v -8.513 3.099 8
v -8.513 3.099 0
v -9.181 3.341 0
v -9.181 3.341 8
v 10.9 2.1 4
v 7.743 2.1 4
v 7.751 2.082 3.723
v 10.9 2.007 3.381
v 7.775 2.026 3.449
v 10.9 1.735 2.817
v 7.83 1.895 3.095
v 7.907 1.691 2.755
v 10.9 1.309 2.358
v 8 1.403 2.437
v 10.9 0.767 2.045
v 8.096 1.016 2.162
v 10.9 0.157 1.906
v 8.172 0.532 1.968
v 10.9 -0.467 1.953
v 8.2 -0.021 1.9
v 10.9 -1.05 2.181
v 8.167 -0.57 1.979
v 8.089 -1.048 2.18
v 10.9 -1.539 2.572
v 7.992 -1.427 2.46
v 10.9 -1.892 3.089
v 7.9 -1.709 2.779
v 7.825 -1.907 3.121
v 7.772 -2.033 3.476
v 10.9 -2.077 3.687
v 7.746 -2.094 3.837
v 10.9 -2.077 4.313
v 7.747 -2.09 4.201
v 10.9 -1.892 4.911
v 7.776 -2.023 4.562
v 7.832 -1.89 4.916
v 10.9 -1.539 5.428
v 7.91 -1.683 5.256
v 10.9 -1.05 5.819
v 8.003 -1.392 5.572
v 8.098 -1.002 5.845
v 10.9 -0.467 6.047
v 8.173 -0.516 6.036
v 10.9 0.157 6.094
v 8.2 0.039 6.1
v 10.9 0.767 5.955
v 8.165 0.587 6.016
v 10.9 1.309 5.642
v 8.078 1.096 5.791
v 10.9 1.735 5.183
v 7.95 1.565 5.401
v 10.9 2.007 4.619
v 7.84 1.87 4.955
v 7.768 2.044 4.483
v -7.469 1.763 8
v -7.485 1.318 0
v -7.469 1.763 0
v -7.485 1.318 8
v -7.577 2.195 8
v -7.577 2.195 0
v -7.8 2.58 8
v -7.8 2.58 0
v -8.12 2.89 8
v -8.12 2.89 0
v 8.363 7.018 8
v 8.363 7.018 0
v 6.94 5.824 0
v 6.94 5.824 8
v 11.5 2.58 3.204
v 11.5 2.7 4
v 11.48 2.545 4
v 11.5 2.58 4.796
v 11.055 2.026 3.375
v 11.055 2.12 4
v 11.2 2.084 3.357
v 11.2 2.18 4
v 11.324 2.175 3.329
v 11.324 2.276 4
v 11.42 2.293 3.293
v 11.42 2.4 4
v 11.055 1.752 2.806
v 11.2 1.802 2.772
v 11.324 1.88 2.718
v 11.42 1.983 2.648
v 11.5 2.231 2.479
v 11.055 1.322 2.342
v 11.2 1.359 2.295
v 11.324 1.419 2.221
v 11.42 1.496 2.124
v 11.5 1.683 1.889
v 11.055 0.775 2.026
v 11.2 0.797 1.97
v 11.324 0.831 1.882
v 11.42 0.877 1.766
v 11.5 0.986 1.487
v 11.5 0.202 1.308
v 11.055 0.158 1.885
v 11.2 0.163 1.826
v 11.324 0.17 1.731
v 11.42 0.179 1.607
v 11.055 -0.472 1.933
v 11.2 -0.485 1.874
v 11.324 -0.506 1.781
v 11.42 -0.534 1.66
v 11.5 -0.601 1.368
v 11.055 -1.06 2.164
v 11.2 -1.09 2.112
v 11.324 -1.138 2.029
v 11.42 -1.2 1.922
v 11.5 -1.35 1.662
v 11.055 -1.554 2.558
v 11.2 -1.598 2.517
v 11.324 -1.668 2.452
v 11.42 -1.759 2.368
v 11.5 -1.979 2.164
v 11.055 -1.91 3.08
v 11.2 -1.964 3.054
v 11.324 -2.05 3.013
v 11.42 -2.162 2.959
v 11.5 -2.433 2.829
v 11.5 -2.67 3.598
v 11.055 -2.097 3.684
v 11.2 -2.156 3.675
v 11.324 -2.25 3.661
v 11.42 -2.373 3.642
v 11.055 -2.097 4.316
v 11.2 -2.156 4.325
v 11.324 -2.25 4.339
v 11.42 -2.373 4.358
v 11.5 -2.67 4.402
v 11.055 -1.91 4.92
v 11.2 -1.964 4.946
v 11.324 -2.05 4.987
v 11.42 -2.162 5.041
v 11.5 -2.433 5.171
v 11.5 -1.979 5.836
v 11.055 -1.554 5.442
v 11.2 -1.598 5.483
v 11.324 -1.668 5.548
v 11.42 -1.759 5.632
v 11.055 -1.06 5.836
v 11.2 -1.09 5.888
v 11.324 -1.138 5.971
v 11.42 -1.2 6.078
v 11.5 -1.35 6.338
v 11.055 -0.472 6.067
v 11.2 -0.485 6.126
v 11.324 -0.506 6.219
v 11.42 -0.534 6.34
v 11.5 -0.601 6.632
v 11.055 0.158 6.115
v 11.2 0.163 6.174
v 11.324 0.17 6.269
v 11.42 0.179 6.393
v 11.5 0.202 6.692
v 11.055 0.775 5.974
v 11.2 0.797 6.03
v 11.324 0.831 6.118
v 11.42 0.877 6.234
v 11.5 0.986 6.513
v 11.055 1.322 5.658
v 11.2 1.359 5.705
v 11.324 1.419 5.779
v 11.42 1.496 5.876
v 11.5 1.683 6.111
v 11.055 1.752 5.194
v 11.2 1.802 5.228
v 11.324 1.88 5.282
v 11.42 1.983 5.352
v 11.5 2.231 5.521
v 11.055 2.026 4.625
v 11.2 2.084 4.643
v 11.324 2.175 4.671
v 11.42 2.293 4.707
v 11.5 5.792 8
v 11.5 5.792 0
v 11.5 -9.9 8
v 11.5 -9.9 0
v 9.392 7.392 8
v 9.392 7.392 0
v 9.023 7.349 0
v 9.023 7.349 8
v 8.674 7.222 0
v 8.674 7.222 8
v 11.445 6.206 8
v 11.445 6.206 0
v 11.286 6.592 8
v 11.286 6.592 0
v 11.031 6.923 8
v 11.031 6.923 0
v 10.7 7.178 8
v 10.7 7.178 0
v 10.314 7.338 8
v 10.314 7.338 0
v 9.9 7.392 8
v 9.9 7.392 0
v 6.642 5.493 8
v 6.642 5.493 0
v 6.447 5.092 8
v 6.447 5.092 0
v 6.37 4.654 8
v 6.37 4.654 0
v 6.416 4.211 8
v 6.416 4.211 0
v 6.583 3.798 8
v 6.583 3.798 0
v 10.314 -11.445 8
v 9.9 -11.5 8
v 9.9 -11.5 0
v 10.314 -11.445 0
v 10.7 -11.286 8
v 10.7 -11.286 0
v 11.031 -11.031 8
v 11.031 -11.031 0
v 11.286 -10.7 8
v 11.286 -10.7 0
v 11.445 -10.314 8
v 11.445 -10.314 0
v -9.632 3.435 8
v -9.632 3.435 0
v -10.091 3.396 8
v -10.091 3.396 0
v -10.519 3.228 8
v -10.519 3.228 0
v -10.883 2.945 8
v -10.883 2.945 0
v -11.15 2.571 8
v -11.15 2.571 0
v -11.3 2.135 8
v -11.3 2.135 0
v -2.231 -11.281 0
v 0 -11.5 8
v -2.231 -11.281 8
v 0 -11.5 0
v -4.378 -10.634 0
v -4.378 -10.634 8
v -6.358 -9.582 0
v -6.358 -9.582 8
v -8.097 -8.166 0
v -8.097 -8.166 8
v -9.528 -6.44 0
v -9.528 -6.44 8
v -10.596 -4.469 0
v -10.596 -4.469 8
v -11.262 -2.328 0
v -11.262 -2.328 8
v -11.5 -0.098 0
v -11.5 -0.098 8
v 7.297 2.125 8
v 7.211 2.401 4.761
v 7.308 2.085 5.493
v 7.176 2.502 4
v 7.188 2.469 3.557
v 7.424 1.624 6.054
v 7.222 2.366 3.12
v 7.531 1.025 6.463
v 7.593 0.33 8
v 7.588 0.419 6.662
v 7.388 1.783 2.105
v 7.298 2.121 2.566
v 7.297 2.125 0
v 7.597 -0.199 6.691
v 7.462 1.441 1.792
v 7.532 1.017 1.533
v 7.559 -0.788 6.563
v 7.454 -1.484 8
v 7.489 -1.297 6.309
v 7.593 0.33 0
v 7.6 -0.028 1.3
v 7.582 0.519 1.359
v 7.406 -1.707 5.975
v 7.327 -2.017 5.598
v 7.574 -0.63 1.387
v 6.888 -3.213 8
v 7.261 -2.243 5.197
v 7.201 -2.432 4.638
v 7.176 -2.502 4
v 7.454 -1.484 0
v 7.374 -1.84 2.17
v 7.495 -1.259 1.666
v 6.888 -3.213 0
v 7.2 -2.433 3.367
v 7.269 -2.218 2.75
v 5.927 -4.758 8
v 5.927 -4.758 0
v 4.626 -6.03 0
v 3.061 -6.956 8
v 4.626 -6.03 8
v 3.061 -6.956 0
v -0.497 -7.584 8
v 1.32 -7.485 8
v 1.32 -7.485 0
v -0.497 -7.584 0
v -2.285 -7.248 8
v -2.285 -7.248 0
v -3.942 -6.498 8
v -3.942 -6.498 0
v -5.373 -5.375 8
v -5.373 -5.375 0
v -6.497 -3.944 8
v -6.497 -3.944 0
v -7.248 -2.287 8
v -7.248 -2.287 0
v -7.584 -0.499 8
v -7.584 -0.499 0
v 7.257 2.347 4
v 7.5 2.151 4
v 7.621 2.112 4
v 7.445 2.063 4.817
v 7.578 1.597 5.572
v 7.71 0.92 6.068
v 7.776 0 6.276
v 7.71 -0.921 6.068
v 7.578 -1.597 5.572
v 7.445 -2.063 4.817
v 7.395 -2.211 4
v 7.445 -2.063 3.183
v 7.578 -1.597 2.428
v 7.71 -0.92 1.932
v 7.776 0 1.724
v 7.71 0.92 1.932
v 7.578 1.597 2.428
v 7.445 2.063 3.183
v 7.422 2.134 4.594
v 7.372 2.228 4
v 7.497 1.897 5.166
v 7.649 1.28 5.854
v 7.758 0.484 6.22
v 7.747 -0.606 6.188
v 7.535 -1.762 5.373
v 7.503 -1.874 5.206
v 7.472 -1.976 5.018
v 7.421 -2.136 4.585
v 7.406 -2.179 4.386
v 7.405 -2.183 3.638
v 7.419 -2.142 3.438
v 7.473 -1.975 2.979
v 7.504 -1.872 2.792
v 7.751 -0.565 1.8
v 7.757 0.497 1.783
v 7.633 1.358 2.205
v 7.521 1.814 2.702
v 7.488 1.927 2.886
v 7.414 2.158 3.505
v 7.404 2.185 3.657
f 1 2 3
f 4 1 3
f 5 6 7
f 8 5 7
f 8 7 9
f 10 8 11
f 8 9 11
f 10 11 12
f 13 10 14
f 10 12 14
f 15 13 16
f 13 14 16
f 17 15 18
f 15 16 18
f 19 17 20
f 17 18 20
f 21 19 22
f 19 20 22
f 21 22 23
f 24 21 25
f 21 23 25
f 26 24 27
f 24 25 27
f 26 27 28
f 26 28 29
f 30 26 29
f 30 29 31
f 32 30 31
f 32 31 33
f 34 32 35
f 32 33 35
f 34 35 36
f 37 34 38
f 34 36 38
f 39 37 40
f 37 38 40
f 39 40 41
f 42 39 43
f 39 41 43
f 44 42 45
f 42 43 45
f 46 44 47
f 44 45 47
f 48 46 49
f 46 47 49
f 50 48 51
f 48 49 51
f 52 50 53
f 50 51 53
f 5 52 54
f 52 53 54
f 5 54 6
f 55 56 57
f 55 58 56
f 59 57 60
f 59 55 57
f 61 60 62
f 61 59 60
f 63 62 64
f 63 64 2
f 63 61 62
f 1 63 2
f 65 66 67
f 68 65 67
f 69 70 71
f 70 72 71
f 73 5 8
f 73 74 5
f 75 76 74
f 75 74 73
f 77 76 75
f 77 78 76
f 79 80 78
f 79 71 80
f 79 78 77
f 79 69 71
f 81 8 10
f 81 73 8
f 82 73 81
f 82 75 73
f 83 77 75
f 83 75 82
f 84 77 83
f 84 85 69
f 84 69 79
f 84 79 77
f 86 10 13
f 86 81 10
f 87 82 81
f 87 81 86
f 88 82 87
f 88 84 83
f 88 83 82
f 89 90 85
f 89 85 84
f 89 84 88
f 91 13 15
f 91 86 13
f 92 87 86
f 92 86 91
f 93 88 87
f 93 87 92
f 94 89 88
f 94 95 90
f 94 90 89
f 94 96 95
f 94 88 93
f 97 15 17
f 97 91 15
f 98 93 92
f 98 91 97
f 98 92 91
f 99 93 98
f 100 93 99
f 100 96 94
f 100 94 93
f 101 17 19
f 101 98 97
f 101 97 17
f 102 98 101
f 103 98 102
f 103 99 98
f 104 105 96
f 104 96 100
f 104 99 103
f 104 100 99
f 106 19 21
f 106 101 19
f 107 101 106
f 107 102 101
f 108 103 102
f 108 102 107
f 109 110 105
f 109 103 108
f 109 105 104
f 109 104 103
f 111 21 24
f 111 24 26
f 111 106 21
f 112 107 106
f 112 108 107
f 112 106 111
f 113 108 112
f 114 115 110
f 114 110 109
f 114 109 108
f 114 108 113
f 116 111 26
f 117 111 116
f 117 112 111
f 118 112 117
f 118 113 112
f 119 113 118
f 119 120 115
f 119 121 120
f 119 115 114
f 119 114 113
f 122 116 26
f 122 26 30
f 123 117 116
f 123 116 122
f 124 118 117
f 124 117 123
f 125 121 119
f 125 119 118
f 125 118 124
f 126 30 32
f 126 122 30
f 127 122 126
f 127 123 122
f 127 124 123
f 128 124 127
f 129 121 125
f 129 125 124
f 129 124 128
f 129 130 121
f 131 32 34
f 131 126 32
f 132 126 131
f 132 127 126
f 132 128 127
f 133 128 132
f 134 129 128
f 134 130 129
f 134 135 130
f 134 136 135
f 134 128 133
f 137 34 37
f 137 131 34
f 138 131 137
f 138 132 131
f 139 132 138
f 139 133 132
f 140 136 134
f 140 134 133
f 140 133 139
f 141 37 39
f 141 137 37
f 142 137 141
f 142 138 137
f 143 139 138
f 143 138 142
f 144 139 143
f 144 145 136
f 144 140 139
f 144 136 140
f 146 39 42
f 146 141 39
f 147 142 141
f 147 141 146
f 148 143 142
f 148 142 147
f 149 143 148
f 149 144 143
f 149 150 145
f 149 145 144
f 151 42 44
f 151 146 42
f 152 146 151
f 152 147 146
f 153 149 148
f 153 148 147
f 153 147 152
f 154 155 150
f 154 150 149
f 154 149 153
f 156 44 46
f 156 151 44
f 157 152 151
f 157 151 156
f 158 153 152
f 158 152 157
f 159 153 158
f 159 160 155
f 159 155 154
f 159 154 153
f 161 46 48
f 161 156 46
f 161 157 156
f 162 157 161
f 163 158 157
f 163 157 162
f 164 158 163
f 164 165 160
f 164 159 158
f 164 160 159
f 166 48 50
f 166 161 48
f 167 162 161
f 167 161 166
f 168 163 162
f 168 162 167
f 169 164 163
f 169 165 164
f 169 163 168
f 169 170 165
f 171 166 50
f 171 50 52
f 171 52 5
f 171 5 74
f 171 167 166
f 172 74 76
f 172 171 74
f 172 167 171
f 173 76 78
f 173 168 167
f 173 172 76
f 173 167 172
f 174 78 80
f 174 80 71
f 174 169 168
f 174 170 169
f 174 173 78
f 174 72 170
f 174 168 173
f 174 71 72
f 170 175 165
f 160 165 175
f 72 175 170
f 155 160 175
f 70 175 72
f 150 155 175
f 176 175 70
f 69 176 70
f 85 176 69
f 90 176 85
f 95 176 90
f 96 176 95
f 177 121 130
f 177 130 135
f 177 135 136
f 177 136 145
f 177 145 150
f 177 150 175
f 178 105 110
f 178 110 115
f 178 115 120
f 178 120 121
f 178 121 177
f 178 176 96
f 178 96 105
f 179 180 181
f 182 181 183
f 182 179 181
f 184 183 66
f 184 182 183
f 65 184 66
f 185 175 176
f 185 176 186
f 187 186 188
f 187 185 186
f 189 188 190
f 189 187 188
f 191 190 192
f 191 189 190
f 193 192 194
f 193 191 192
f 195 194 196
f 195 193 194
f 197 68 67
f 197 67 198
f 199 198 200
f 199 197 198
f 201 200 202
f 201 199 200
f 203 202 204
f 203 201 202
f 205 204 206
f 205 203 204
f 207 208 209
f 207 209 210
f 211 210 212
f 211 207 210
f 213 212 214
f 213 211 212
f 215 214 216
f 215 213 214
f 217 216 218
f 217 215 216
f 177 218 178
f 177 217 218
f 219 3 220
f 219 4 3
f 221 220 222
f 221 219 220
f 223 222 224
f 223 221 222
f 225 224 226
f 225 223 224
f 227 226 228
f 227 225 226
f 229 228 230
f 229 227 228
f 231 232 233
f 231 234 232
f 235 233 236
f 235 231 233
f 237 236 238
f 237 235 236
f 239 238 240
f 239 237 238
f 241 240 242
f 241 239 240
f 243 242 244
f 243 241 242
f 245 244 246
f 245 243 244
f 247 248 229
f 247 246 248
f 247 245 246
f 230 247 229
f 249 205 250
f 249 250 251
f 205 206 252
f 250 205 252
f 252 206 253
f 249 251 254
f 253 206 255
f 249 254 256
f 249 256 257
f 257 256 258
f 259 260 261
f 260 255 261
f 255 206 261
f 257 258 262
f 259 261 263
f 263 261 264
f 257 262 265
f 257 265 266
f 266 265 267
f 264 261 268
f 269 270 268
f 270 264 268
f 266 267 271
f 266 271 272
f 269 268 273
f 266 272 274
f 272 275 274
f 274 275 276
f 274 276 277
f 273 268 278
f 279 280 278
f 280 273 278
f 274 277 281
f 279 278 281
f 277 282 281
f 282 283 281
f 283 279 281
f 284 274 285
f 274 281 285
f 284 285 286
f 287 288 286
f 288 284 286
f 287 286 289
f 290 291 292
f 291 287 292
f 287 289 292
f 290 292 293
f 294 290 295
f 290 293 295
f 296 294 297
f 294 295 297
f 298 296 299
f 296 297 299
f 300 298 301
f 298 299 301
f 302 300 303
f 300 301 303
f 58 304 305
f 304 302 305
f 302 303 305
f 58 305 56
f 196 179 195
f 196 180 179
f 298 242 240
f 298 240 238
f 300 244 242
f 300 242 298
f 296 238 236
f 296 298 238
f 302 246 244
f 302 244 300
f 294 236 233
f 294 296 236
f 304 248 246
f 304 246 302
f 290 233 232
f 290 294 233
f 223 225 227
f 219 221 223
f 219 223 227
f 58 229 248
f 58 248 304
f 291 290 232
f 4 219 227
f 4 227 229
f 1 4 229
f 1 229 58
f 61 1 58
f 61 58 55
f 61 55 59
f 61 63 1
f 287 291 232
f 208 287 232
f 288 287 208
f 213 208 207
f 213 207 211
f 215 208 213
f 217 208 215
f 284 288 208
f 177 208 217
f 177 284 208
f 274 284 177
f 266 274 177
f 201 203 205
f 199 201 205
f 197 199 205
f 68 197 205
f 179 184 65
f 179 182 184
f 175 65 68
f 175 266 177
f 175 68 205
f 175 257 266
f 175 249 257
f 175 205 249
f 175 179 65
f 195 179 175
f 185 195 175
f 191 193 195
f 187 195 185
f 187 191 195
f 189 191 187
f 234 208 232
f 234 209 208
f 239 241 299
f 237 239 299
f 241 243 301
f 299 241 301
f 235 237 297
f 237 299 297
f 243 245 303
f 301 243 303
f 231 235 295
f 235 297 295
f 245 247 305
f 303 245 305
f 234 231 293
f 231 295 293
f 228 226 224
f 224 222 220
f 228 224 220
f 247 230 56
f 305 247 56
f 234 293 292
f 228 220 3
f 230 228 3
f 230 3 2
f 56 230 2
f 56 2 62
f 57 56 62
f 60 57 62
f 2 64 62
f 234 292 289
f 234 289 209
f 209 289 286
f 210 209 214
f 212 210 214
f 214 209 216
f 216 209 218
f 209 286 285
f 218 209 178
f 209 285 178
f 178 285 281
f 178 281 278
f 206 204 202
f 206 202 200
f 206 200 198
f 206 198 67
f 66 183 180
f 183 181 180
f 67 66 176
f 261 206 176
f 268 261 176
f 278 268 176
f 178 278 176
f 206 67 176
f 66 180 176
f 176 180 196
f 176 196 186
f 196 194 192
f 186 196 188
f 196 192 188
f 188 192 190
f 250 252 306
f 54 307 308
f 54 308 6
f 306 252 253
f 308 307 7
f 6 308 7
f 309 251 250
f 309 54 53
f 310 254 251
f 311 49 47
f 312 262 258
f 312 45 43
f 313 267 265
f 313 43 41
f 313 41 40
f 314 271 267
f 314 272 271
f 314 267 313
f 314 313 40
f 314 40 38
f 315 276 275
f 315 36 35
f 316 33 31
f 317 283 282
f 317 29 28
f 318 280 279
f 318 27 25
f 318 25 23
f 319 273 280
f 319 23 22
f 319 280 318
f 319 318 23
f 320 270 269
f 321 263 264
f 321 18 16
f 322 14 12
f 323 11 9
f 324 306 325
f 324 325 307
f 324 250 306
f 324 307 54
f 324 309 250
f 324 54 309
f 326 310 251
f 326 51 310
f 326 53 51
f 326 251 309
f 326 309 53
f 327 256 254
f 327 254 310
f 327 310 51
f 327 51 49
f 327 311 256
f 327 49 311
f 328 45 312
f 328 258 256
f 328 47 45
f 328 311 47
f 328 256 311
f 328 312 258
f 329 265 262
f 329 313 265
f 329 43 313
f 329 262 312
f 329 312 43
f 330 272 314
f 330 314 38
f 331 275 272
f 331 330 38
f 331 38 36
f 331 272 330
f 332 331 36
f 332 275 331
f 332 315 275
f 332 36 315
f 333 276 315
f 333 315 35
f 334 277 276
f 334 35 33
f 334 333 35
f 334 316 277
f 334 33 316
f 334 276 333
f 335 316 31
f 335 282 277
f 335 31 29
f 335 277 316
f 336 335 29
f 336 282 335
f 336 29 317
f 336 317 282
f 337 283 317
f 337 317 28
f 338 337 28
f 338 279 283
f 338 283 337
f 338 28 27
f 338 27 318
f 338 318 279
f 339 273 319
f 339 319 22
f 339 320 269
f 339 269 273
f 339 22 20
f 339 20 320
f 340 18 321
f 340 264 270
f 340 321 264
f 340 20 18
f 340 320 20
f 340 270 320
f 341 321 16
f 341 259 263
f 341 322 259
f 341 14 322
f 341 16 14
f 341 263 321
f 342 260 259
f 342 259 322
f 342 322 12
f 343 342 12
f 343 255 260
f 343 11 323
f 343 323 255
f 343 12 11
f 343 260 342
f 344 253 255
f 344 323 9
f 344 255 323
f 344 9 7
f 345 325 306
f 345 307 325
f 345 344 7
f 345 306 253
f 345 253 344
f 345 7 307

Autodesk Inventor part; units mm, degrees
ref_plane "YZ Plane" through (0, 0, 0) normal (1, 0, 0) x (0, 1, 0)
ref_plane "XZ Plane" through (0, 0, 0) normal (0, 1, 0) x (-1, 0, 0)
ref_plane "XY Plane" through (0, 0, 0) normal (0, 0, 1) x (1, 0, 0)
sketch "Эскиз1" plane through (0, 0, 0) normal (0, 0, 1) x (1, 0, 0)
  circle A0 centre (0, 0) radius 7.6
  circle A1 centre (0, 0) radius 11.5
  line L0 (8.8095, 7.3921) -> (0, 0)
  line L1 (-16.1, 0) -> (16.1, 0) construction
  line L2 (0, 0) -> (-10.8065, 3.9332)
  line L3 (8.8095, 7.3921) -> (11.5, 7.3921)
  line L4 (11.5, 7.3921) -> (11.5, -11.5)
  line L5 (11.5, -11.5) -> (0, -11.5)
  point P0 (5.8219, 4.8852)
  point P1 (-5.8219, -4.8852)
  point P2 (-7.1417, 2.5994)
  point P3 (11.5, 0)
  dimension "d0" = 15.2
  dimension "d2" = 23
  dimension "d8" = 40
  dimension "d11" = 20
extrude "Выдавливание1" add sketch "Эскиз1" along normal blind 8 contours A0 L0 A1 L2 | L3 L4 A1 | L4 L5 A1 picked at (-9.7933, 2.5948)
sketch "Эскиз2" plane through (0, 0, 0) normal (1, 0, 0) x (0, 1, 0)
  circle A0 centre (0, 4) radius 2.1
  line L0 (3.9332, 8) -> (-11.5, 8) projected
  line L1 (3.9332, 0) -> (-11.5, 0) projected
  line L2 (0, 8) -> (0, 0) construction
  dimension "d5" = 4.2
extrude "Выдавливание2" cut sketch "Эскиз2" along normal blind 15
fillet "Сопряжение1" radius 1.6 6 edges at (8.8095, 7.3921, 4) (5.8219, 4.8852, 4) (-7.1417, 2.5994, 4) (-10.8065, 3.9332, 4) (11.5, 7.3921, 4) (11.5, -11.5, 4)
fillet "Сопряжение1" radius 0.6 2 edges at (7.3041, -2.1, 4.0117) (11.5, -2.1, 4)
properties part number "Кольцо линейного подшипника"
